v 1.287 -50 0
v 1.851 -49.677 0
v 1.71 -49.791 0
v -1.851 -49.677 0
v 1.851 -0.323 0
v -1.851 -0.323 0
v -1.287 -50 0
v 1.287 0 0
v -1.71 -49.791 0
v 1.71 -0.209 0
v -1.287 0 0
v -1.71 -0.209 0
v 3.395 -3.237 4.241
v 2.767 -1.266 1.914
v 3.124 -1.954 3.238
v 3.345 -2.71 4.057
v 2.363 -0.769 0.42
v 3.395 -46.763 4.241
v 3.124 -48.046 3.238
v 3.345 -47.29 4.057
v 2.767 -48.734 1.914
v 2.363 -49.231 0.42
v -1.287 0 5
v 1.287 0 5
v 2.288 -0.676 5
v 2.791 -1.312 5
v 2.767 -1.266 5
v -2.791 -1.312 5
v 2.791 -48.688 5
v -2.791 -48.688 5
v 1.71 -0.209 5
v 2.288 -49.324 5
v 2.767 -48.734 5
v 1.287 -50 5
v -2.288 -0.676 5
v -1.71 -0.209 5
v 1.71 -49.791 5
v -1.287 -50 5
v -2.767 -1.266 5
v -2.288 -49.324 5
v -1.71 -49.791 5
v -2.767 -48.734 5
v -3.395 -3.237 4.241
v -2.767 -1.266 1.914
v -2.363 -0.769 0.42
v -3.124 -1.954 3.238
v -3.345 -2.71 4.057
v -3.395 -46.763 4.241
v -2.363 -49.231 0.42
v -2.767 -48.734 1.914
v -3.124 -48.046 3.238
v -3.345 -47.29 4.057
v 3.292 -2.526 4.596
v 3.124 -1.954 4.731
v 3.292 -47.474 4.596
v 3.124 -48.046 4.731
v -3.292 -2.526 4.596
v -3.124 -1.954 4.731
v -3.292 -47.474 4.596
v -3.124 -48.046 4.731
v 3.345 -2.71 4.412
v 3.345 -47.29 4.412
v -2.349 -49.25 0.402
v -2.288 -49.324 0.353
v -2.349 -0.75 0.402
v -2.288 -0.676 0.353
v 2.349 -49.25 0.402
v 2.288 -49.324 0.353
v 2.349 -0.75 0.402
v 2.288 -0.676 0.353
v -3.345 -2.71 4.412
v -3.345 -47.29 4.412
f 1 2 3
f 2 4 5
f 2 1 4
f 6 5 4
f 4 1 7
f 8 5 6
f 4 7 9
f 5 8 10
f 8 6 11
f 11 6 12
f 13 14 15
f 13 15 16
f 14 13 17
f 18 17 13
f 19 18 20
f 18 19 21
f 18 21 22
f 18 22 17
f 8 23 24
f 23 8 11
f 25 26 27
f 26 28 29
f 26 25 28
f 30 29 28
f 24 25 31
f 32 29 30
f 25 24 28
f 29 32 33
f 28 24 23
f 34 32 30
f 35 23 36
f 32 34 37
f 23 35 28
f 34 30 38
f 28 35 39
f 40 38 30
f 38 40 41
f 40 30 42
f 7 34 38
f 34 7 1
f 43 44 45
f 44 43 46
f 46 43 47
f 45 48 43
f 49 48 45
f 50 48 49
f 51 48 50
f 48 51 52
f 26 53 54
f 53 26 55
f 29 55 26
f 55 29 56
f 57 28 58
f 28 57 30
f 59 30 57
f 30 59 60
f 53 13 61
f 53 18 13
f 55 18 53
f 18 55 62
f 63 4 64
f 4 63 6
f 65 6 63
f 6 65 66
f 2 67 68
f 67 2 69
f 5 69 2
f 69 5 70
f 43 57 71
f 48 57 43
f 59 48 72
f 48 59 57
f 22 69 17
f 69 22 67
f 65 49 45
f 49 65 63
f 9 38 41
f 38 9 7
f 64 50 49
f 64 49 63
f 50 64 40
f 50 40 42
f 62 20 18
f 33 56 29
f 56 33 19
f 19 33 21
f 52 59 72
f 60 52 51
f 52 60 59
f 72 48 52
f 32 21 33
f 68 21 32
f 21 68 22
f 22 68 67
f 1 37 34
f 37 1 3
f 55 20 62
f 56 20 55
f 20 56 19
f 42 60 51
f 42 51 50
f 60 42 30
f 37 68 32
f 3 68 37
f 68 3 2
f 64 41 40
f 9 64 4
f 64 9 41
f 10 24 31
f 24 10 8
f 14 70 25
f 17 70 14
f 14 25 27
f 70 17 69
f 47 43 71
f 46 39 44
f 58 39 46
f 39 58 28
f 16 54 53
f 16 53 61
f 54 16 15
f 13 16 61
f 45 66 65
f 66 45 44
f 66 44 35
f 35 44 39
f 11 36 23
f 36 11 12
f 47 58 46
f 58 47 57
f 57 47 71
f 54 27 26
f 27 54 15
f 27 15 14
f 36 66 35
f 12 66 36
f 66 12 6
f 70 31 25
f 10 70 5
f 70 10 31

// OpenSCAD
// file: ../../globals.scad
/*
Most things in this file is represented as one millimeter, so keep that in mind while changing things.
Some of the setting are not mm but at variables that you can set, such as 2*x=2x and you are setting what x is.
I will try to specify when things are variables and not exact measurements.
*/

//Virindi settings
dovetail_male_width_scale = 0.98;
dovetail_male_height_scale = 0.91;

obj_leg = 30;
leg_length = 5.5;
small_number = 0.001;
metal_core_rode_global = 5;


///////////////// number of holes /////////////////////
z_hole_number = 8;
other_holes = 8;

///////////////// Pins /////////////////////

//pins that poke out
ball_size = 10;
pin_height = 20;
pin_diameter = 6;


//holes
hole_ball_size = ball_size;
hole_pin_height = pin_height;
hole_pin_diameter = pin_diameter;

///////////////// Z THINGS /////////////////////

berring_slot_width = 7.5;
berring_slot_depth = 6.5;
metal_core_rode = 5;

///////////////// X THINGS /////////////////////

//male dove tails
max_width=8;
min_width=5;
depth=5;
height=obj_leg/2;

//female dove tails, this is found on the y mounts
girl_max_width=11;
girl_min_width=5;
girl_depth=5;
girl_height=obj_leg;


///////////////// Y THINGS /////////////////////
/*
The Y is so normal that all of those global variables at the top should change all of the setting in it, this section is set her incase there are variables set in the future development of this project.
*/
// file: ../../include.scad
//////////////////      END SECTION       //////////////////

	module added_pins(){
		difference(){
			union(){
				translate([30/(15/4),obj_leg*leg_length,30/(15/4)]) pin();
				translate([30/(15/4)+14.5,obj_leg*leg_length,30/(15/4)+14]) pin();
			}
			union(){
							translate([30/(15/4)+13.5,obj_leg*leg_length-20,30/(15/4)+5])cube(size=[2,40,15]);
							translate([30/(15/4)+7.5,obj_leg*leg_length-20,30/(15/4)+15])rotate([0,90,0]) cube(size=[2,40,15]);	

							translate([30/(15/4)-1,obj_leg*leg_length-20,30/(15/4)-8])cube(size=[2,40,15]);
							translate([30/(15/4)-10,obj_leg*leg_length-20,30/(15/4)+1])rotate([0,90,0]) cube(size=[2,40,15]);
			}
		}
	}
	module taken_pins() {
		translate([30/(15/4)+14,obj_leg*leg_length-10,30/(15/4)]) mirror_pin();
		translate([30/(15/4),obj_leg*leg_length-10,30/(15/4)+15]) mirror_pin();
	}


//////////////////      OTHER STUFF       //////////////////

	module holes() {
		rotate([0,0,90]) for(y=[0:other_holes])
		translate([obj_leg+y*15,-15.5,7.5]) union() {
			translate([7.5,0,15]) hole_up();
			hole_down();
		}
	}
	module extend_holes() {
	module top(){
		rotate([0,0,90]) for(y=[0:other_holes+1])
		translate([(30/4)+y*15,-15.5,7.5]) union() {
			translate([7.5,0,15]) hole_up();
		}
	}
	module bottom(){
		rotate([0,0,90]) for(y=[0:other_holes+2])
		translate([(30/4)+y*15,-15.5,7.5]) union() {
			hole_down();
		
}
	}
	union(){
		top();
		bottom();
	}
	}

	module hole() {
		union() {
			rotate([90, 90, 0]) cylinder(h=40, d=hole_pin_diameter, center=true);
			translate([0,7.5,0]) sphere(d=hole_ball_size);
			translate([0,-6,0]) sphere(d=hole_ball_size);
		}
	}
	module hole_up() {
		union() {
			rotate([90, 90, 0]) cylinder(h=40, d=hole_pin_diameter, center=true);
			translate([0,7.5,10]) cylinder(h=hole_pin_height, d=hole_pin_diameter, center=true);
			translate([0,-6,10]) cylinder(h=hole_pin_height, d=hole_pin_diameter, center=true);
			translate([0,7.5,0]) sphere(d=hole_ball_size);
			translate([0,-6,0]) sphere(d=hole_ball_size);
		}
	}
	module hole_down() {
		union() {
			rotate([90, 90, 0]) cylinder(h=40, d=hole_pin_diameter, center=true);
			translate([0,7.5,-10]) cylinder(h=hole_pin_height, d=hole_pin_diameter, center=true);
			translate([0,-6,-10]) cylinder(h=hole_pin_height, d=hole_pin_diameter, center=true);
			translate([0,7.5,0]) sphere(d=hole_ball_size);
			translate([0,-6,0]) sphere(d=hole_ball_size);
		}
	}
	module pin() {
		union() {
			rotate([90, 90, 0]) cylinder(h=pin_height, d=pin_diameter, center=true);
			translate([0,7.5,0]) sphere(d=ball_size);
		}
	}

	module mirror_pin() {
		rotate([90, 90, 0]) cylinder(h=hole_pin_height+small_number, d=hole_pin_diameter, center=true);
		translate([0,-(pin_height-(ball_size/2)),0]) sphere(d=ball_size);
	}


//////////////////      SOME RACK AND Z THINGS       //////////////////

module z_holes() {
    rotate([0,-90,0]) for(z=[0:z_hole_number])
    translate([22.5+z*15,16,-12])
        hole();
}

module pin_cuts() {
	union(){
		cube(size=[2,10,40], center=true);
		rotate([0,0,90]) cube(size=[2,10,40], center=true);
	}
}
module pin_uncut() {
	union(){
		rotate([0, 0, 90]) cylinder(h=hole_pin_height, d=hole_pin_diameter, center=true);
		translate([0,0,10]) sphere(d=ball_hole);
	}
}


module pin_out() {
	union(){
		rotate([0, 0, 90]) cylinder(h=pin_height, d=pin_diameter, center=true);
		translate([0,0,10]) sphere(d= ball_size);
	}
}


module pins_z(){
	difference() {
		pin_out();
		pin_cuts();
	}
}
//////////////////      RACK AND SLIDE     ///////////////////

module straight_pins() {
	for(z=[0:((((obj_leg*leg_length)*2)-(obj_leg*2))/3)/14.5]) rotate([-90,0,0]) translate([z*15,30/(15/4),14]) pins_z();
	for(z=[0:((((obj_leg*leg_length)*2)-(obj_leg*2))/3)/14.5]) rotate([-90,0,0]) translate([z*15,30/(15/4)-14,14]) pins_z();
}
module stagger_pins() {
	for(z=[0:((((obj_leg*leg_length)*2)-(obj_leg*2))/3)/14.5]) rotate([-90,0,0]) translate([z*15,30/(15/4),14]) pins_z();
	for(z=[0:((((obj_leg*leg_length)*2)-(obj_leg*2))/3)/14.5]) rotate([-90,0,0]) translate([z*15+7,30/(15/4)-14,14]) pins_z();
}


//////////////////      DOVE TAIL       //////////////////

module male_dovetail(height) {
	dovetail_3d(max_width,min_width,depth,height);
}

module dovetail_3d(max_width=11, min_width=5, depth=5, height=30) {
	linear_extrude(height=height, convexity=2)
		dovetail_2d(max_width,min_width,depth);
}

module dovetail_2d(max_width=11, min_width=5, depth=5) {
	angle=atan((max_width/2-min_width/2)/depth);
	echo("angle: ", angle);
	polygon(paths=[[0,1,2,3,0]], points=[[-min_width/2,0], [-max_width/2,depth], [max_width/2, depth], [min_width/2,0]]);
}

//bow tie
	module tie_end(height){
				rotate([0,0,0]) translate([0,-0.01,((obj_leg/2)/2)]) male_dovetail(height);
				rotate([0,90,0]) translate([0,-0.01,((obj_leg/2)/2)]) male_dovetail(height);
				rotate([0,180,0]) translate([0,-0.01,((obj_leg/2)/2)]) male_dovetail(height);
				rotate([0,-90,0]) translate([0,-0.01,((obj_leg/2)/2)]) male_dovetail(height);
	}

module bow_support(){
	difference(){
		intersection(){
			translate([-15,0,-15]) cube([30,9,30]);
			scale([1.05,1.05,1.05]) rotate([0,45,0]) tie_end();
		}
		cube([29.2,29.2,29.2], center=true);
	}
}

	module wrap(units){
	for (y = [-1:units-2]) // two iterations, z = -1, z = 1
	{
			translate([15, (y*30)+15, 15]){
			for (r = [0:4]) // two iterations, z = -1, z = 1
			{
				rotate([0,r*90,0]) translate([0,15,15]) rotate([-90,0,0])male_dovetail(height=30);
			}
		}
	}
	}
// main file
length = 50;
tilt_level = 1.1;
scaling_x = .9;
scaling_y = 1;
scaling_z = 1;
include <../../include.scad>;
include <../../globals.scad>;

$fn=30;
module end(){
    difference() {
        translate([-4, -5, -0.2]) cube([8, 5, 6]);
        translate([0, 0, -0.5])cylinder(r=3.8, h=7);
    }
}

module tie() {
    intersection() {
        intersection() {
            rotate([90,0,0]) male_dovetail(height=length);
            rotate([90,0,0]) cylinder(r=5.9, h=200);
        }
        translate([0,0,3.3]) rotate([90,0,0]) cylinder(r=3.9, h=100);
    }
}
scale([scaling_x,scaling_y,scaling_z]) difference () {
    tie();
    translate([0, -(length -3.5), 0]) end();
    translate([0, -3.5, 0]) rotate([0,0,180]) end();
}
